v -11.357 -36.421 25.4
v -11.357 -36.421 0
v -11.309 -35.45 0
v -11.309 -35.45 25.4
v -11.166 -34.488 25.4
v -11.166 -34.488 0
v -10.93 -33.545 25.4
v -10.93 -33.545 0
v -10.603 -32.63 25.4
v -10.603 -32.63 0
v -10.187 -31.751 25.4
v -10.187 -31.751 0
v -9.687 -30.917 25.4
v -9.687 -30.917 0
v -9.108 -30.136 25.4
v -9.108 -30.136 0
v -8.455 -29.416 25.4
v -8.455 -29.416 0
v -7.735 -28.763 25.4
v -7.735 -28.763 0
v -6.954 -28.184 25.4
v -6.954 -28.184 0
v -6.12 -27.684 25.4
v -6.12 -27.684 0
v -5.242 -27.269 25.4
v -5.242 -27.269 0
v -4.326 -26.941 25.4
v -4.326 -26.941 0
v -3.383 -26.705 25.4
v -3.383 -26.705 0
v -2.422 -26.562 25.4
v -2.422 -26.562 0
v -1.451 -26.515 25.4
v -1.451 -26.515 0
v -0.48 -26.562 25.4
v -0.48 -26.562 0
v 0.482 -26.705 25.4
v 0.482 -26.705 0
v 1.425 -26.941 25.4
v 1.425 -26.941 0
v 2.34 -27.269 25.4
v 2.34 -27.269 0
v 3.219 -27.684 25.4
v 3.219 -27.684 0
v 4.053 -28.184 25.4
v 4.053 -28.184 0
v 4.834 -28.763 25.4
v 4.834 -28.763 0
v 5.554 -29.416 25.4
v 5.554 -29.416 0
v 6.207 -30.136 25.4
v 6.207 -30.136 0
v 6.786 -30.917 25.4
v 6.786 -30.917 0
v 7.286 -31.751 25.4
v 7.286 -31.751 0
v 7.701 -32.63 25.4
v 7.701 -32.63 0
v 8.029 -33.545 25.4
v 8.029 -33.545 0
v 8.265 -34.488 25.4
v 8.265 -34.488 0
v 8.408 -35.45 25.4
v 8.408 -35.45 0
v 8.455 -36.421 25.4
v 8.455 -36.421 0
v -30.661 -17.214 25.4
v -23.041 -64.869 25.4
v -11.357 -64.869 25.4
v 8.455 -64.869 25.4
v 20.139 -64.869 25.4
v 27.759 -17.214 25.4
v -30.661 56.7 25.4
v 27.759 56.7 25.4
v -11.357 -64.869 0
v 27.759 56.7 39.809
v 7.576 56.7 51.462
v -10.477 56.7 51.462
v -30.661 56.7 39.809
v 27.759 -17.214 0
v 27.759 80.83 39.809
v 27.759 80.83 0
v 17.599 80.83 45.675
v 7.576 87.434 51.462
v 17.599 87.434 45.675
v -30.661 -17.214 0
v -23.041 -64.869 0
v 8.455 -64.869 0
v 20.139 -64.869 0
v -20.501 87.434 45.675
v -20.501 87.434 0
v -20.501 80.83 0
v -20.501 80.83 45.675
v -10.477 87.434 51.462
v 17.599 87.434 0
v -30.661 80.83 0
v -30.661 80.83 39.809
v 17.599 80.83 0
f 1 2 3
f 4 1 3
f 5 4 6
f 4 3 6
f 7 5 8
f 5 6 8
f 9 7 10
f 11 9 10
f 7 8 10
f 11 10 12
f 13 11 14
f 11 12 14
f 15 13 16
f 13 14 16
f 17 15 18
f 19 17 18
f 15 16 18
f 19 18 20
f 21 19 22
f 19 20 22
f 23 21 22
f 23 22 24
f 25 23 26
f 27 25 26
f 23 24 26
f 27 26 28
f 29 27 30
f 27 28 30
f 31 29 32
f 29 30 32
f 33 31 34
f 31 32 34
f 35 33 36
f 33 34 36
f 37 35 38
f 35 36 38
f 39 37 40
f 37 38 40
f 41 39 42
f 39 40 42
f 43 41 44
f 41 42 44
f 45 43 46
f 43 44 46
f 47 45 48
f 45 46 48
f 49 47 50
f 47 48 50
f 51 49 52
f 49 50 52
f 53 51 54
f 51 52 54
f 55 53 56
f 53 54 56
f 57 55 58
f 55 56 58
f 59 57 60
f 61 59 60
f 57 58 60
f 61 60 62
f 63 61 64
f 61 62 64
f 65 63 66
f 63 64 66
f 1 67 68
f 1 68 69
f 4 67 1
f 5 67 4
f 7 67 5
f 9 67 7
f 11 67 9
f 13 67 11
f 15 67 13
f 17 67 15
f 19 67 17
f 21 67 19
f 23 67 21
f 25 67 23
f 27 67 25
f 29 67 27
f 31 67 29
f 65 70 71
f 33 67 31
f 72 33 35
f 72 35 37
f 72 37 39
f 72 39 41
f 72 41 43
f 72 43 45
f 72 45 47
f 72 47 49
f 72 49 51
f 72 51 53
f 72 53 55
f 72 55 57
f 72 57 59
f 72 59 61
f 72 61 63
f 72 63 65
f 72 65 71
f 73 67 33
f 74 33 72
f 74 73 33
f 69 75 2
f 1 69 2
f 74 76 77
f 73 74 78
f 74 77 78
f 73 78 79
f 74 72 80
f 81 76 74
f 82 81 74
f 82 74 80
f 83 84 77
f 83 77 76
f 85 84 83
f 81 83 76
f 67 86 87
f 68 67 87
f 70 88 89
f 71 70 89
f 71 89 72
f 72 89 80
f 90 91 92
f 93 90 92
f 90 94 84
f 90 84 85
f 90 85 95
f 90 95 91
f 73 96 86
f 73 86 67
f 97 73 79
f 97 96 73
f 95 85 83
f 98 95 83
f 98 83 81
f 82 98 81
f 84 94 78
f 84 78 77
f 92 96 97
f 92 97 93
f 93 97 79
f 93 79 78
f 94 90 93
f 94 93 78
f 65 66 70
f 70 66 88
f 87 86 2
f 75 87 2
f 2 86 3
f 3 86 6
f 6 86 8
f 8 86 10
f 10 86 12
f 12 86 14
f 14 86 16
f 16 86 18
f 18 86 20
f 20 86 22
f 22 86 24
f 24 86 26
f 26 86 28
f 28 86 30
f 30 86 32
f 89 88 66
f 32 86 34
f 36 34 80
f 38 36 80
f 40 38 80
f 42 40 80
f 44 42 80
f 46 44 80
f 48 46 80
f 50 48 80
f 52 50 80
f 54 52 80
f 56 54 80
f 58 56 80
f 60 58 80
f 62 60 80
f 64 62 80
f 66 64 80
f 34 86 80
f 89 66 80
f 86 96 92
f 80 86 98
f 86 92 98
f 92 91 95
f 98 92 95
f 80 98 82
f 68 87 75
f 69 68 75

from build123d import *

# Parameters (mm, degrees)
F1_DEPTH = 25.4
F3_DEPTH = 30.734
F4_W     = 10.16
F4_H     = 6.604
F5_DEPTH = 51.463376
F6_W     = 10.16
F6_H     = 6.604
F7_DEPTH = 51.463376


with BuildPart() as f1:
    # F0 (on Top) → F1 (new body)
    with BuildSketch(Plane.XY):
        with BuildLine():
            Line((27.759297, 87.433918), (-30.660703, 87.433918))
            Line((-30.660703, 87.433918), (-30.660703, -17.214082))
            Line((-30.660703, -17.214082), (-23.040703, -64.868706))
            Line((-23.040703, -64.868706), (-11.356703, -64.868706))
            Line((-11.356703, -64.868706), (-11.356703, -36.420706))
            ThreePointArc((-11.356703, -36.420706), (-1.450703, -26.514706), (8.455297, -36.420706))
            Line((8.455297, -36.420706), (8.455297, -64.868706))
            Line((8.455297, -64.868706), (20.139297, -64.868706))
            Line((20.139297, -64.868706), (27.759297, -17.214082))
            Line((27.759297, -17.214082), (27.759297, 87.433918))
        make_face()
    extrude(amount=F1_DEPTH)

    # F2 (on face) → F3 (join)
    with BuildSketch(Plane(origin=(0, 87.433918, 0), x_dir=(-1, 0, 0), z_dir=(0, 1, 0))):
        Polygon((10.477128, 51.462376), (-7.575722, 51.462376), (-27.759297, 39.809384), (-27.759297, 25.4), (30.660703, 25.4), (30.660703, 39.809384), align=None)
    extrude(amount=-F3_DEPTH)

    # F4 (on face) → F5 (cut, through all)
    with BuildSketch(Plane(origin=(0, 0, 0), x_dir=(1, 0, 0), z_dir=(0, 0, -1))):
        with Locations((-25.580703, -84.131918)):
            Rectangle(F4_W, F4_H)
    extrude(amount=-F5_DEPTH, mode=Mode.SUBTRACT)

    # F6 (on face) → F7 (cut, through all)
    with BuildSketch(Plane(origin=(0, 0, 0), x_dir=(1, 0, 0), z_dir=(0, 0, -1))):
        with Locations((22.679297, -84.131918)):
            Rectangle(F6_W, F6_H)
    extrude(amount=-F7_DEPTH, mode=Mode.SUBTRACT)


solid = f1.part
